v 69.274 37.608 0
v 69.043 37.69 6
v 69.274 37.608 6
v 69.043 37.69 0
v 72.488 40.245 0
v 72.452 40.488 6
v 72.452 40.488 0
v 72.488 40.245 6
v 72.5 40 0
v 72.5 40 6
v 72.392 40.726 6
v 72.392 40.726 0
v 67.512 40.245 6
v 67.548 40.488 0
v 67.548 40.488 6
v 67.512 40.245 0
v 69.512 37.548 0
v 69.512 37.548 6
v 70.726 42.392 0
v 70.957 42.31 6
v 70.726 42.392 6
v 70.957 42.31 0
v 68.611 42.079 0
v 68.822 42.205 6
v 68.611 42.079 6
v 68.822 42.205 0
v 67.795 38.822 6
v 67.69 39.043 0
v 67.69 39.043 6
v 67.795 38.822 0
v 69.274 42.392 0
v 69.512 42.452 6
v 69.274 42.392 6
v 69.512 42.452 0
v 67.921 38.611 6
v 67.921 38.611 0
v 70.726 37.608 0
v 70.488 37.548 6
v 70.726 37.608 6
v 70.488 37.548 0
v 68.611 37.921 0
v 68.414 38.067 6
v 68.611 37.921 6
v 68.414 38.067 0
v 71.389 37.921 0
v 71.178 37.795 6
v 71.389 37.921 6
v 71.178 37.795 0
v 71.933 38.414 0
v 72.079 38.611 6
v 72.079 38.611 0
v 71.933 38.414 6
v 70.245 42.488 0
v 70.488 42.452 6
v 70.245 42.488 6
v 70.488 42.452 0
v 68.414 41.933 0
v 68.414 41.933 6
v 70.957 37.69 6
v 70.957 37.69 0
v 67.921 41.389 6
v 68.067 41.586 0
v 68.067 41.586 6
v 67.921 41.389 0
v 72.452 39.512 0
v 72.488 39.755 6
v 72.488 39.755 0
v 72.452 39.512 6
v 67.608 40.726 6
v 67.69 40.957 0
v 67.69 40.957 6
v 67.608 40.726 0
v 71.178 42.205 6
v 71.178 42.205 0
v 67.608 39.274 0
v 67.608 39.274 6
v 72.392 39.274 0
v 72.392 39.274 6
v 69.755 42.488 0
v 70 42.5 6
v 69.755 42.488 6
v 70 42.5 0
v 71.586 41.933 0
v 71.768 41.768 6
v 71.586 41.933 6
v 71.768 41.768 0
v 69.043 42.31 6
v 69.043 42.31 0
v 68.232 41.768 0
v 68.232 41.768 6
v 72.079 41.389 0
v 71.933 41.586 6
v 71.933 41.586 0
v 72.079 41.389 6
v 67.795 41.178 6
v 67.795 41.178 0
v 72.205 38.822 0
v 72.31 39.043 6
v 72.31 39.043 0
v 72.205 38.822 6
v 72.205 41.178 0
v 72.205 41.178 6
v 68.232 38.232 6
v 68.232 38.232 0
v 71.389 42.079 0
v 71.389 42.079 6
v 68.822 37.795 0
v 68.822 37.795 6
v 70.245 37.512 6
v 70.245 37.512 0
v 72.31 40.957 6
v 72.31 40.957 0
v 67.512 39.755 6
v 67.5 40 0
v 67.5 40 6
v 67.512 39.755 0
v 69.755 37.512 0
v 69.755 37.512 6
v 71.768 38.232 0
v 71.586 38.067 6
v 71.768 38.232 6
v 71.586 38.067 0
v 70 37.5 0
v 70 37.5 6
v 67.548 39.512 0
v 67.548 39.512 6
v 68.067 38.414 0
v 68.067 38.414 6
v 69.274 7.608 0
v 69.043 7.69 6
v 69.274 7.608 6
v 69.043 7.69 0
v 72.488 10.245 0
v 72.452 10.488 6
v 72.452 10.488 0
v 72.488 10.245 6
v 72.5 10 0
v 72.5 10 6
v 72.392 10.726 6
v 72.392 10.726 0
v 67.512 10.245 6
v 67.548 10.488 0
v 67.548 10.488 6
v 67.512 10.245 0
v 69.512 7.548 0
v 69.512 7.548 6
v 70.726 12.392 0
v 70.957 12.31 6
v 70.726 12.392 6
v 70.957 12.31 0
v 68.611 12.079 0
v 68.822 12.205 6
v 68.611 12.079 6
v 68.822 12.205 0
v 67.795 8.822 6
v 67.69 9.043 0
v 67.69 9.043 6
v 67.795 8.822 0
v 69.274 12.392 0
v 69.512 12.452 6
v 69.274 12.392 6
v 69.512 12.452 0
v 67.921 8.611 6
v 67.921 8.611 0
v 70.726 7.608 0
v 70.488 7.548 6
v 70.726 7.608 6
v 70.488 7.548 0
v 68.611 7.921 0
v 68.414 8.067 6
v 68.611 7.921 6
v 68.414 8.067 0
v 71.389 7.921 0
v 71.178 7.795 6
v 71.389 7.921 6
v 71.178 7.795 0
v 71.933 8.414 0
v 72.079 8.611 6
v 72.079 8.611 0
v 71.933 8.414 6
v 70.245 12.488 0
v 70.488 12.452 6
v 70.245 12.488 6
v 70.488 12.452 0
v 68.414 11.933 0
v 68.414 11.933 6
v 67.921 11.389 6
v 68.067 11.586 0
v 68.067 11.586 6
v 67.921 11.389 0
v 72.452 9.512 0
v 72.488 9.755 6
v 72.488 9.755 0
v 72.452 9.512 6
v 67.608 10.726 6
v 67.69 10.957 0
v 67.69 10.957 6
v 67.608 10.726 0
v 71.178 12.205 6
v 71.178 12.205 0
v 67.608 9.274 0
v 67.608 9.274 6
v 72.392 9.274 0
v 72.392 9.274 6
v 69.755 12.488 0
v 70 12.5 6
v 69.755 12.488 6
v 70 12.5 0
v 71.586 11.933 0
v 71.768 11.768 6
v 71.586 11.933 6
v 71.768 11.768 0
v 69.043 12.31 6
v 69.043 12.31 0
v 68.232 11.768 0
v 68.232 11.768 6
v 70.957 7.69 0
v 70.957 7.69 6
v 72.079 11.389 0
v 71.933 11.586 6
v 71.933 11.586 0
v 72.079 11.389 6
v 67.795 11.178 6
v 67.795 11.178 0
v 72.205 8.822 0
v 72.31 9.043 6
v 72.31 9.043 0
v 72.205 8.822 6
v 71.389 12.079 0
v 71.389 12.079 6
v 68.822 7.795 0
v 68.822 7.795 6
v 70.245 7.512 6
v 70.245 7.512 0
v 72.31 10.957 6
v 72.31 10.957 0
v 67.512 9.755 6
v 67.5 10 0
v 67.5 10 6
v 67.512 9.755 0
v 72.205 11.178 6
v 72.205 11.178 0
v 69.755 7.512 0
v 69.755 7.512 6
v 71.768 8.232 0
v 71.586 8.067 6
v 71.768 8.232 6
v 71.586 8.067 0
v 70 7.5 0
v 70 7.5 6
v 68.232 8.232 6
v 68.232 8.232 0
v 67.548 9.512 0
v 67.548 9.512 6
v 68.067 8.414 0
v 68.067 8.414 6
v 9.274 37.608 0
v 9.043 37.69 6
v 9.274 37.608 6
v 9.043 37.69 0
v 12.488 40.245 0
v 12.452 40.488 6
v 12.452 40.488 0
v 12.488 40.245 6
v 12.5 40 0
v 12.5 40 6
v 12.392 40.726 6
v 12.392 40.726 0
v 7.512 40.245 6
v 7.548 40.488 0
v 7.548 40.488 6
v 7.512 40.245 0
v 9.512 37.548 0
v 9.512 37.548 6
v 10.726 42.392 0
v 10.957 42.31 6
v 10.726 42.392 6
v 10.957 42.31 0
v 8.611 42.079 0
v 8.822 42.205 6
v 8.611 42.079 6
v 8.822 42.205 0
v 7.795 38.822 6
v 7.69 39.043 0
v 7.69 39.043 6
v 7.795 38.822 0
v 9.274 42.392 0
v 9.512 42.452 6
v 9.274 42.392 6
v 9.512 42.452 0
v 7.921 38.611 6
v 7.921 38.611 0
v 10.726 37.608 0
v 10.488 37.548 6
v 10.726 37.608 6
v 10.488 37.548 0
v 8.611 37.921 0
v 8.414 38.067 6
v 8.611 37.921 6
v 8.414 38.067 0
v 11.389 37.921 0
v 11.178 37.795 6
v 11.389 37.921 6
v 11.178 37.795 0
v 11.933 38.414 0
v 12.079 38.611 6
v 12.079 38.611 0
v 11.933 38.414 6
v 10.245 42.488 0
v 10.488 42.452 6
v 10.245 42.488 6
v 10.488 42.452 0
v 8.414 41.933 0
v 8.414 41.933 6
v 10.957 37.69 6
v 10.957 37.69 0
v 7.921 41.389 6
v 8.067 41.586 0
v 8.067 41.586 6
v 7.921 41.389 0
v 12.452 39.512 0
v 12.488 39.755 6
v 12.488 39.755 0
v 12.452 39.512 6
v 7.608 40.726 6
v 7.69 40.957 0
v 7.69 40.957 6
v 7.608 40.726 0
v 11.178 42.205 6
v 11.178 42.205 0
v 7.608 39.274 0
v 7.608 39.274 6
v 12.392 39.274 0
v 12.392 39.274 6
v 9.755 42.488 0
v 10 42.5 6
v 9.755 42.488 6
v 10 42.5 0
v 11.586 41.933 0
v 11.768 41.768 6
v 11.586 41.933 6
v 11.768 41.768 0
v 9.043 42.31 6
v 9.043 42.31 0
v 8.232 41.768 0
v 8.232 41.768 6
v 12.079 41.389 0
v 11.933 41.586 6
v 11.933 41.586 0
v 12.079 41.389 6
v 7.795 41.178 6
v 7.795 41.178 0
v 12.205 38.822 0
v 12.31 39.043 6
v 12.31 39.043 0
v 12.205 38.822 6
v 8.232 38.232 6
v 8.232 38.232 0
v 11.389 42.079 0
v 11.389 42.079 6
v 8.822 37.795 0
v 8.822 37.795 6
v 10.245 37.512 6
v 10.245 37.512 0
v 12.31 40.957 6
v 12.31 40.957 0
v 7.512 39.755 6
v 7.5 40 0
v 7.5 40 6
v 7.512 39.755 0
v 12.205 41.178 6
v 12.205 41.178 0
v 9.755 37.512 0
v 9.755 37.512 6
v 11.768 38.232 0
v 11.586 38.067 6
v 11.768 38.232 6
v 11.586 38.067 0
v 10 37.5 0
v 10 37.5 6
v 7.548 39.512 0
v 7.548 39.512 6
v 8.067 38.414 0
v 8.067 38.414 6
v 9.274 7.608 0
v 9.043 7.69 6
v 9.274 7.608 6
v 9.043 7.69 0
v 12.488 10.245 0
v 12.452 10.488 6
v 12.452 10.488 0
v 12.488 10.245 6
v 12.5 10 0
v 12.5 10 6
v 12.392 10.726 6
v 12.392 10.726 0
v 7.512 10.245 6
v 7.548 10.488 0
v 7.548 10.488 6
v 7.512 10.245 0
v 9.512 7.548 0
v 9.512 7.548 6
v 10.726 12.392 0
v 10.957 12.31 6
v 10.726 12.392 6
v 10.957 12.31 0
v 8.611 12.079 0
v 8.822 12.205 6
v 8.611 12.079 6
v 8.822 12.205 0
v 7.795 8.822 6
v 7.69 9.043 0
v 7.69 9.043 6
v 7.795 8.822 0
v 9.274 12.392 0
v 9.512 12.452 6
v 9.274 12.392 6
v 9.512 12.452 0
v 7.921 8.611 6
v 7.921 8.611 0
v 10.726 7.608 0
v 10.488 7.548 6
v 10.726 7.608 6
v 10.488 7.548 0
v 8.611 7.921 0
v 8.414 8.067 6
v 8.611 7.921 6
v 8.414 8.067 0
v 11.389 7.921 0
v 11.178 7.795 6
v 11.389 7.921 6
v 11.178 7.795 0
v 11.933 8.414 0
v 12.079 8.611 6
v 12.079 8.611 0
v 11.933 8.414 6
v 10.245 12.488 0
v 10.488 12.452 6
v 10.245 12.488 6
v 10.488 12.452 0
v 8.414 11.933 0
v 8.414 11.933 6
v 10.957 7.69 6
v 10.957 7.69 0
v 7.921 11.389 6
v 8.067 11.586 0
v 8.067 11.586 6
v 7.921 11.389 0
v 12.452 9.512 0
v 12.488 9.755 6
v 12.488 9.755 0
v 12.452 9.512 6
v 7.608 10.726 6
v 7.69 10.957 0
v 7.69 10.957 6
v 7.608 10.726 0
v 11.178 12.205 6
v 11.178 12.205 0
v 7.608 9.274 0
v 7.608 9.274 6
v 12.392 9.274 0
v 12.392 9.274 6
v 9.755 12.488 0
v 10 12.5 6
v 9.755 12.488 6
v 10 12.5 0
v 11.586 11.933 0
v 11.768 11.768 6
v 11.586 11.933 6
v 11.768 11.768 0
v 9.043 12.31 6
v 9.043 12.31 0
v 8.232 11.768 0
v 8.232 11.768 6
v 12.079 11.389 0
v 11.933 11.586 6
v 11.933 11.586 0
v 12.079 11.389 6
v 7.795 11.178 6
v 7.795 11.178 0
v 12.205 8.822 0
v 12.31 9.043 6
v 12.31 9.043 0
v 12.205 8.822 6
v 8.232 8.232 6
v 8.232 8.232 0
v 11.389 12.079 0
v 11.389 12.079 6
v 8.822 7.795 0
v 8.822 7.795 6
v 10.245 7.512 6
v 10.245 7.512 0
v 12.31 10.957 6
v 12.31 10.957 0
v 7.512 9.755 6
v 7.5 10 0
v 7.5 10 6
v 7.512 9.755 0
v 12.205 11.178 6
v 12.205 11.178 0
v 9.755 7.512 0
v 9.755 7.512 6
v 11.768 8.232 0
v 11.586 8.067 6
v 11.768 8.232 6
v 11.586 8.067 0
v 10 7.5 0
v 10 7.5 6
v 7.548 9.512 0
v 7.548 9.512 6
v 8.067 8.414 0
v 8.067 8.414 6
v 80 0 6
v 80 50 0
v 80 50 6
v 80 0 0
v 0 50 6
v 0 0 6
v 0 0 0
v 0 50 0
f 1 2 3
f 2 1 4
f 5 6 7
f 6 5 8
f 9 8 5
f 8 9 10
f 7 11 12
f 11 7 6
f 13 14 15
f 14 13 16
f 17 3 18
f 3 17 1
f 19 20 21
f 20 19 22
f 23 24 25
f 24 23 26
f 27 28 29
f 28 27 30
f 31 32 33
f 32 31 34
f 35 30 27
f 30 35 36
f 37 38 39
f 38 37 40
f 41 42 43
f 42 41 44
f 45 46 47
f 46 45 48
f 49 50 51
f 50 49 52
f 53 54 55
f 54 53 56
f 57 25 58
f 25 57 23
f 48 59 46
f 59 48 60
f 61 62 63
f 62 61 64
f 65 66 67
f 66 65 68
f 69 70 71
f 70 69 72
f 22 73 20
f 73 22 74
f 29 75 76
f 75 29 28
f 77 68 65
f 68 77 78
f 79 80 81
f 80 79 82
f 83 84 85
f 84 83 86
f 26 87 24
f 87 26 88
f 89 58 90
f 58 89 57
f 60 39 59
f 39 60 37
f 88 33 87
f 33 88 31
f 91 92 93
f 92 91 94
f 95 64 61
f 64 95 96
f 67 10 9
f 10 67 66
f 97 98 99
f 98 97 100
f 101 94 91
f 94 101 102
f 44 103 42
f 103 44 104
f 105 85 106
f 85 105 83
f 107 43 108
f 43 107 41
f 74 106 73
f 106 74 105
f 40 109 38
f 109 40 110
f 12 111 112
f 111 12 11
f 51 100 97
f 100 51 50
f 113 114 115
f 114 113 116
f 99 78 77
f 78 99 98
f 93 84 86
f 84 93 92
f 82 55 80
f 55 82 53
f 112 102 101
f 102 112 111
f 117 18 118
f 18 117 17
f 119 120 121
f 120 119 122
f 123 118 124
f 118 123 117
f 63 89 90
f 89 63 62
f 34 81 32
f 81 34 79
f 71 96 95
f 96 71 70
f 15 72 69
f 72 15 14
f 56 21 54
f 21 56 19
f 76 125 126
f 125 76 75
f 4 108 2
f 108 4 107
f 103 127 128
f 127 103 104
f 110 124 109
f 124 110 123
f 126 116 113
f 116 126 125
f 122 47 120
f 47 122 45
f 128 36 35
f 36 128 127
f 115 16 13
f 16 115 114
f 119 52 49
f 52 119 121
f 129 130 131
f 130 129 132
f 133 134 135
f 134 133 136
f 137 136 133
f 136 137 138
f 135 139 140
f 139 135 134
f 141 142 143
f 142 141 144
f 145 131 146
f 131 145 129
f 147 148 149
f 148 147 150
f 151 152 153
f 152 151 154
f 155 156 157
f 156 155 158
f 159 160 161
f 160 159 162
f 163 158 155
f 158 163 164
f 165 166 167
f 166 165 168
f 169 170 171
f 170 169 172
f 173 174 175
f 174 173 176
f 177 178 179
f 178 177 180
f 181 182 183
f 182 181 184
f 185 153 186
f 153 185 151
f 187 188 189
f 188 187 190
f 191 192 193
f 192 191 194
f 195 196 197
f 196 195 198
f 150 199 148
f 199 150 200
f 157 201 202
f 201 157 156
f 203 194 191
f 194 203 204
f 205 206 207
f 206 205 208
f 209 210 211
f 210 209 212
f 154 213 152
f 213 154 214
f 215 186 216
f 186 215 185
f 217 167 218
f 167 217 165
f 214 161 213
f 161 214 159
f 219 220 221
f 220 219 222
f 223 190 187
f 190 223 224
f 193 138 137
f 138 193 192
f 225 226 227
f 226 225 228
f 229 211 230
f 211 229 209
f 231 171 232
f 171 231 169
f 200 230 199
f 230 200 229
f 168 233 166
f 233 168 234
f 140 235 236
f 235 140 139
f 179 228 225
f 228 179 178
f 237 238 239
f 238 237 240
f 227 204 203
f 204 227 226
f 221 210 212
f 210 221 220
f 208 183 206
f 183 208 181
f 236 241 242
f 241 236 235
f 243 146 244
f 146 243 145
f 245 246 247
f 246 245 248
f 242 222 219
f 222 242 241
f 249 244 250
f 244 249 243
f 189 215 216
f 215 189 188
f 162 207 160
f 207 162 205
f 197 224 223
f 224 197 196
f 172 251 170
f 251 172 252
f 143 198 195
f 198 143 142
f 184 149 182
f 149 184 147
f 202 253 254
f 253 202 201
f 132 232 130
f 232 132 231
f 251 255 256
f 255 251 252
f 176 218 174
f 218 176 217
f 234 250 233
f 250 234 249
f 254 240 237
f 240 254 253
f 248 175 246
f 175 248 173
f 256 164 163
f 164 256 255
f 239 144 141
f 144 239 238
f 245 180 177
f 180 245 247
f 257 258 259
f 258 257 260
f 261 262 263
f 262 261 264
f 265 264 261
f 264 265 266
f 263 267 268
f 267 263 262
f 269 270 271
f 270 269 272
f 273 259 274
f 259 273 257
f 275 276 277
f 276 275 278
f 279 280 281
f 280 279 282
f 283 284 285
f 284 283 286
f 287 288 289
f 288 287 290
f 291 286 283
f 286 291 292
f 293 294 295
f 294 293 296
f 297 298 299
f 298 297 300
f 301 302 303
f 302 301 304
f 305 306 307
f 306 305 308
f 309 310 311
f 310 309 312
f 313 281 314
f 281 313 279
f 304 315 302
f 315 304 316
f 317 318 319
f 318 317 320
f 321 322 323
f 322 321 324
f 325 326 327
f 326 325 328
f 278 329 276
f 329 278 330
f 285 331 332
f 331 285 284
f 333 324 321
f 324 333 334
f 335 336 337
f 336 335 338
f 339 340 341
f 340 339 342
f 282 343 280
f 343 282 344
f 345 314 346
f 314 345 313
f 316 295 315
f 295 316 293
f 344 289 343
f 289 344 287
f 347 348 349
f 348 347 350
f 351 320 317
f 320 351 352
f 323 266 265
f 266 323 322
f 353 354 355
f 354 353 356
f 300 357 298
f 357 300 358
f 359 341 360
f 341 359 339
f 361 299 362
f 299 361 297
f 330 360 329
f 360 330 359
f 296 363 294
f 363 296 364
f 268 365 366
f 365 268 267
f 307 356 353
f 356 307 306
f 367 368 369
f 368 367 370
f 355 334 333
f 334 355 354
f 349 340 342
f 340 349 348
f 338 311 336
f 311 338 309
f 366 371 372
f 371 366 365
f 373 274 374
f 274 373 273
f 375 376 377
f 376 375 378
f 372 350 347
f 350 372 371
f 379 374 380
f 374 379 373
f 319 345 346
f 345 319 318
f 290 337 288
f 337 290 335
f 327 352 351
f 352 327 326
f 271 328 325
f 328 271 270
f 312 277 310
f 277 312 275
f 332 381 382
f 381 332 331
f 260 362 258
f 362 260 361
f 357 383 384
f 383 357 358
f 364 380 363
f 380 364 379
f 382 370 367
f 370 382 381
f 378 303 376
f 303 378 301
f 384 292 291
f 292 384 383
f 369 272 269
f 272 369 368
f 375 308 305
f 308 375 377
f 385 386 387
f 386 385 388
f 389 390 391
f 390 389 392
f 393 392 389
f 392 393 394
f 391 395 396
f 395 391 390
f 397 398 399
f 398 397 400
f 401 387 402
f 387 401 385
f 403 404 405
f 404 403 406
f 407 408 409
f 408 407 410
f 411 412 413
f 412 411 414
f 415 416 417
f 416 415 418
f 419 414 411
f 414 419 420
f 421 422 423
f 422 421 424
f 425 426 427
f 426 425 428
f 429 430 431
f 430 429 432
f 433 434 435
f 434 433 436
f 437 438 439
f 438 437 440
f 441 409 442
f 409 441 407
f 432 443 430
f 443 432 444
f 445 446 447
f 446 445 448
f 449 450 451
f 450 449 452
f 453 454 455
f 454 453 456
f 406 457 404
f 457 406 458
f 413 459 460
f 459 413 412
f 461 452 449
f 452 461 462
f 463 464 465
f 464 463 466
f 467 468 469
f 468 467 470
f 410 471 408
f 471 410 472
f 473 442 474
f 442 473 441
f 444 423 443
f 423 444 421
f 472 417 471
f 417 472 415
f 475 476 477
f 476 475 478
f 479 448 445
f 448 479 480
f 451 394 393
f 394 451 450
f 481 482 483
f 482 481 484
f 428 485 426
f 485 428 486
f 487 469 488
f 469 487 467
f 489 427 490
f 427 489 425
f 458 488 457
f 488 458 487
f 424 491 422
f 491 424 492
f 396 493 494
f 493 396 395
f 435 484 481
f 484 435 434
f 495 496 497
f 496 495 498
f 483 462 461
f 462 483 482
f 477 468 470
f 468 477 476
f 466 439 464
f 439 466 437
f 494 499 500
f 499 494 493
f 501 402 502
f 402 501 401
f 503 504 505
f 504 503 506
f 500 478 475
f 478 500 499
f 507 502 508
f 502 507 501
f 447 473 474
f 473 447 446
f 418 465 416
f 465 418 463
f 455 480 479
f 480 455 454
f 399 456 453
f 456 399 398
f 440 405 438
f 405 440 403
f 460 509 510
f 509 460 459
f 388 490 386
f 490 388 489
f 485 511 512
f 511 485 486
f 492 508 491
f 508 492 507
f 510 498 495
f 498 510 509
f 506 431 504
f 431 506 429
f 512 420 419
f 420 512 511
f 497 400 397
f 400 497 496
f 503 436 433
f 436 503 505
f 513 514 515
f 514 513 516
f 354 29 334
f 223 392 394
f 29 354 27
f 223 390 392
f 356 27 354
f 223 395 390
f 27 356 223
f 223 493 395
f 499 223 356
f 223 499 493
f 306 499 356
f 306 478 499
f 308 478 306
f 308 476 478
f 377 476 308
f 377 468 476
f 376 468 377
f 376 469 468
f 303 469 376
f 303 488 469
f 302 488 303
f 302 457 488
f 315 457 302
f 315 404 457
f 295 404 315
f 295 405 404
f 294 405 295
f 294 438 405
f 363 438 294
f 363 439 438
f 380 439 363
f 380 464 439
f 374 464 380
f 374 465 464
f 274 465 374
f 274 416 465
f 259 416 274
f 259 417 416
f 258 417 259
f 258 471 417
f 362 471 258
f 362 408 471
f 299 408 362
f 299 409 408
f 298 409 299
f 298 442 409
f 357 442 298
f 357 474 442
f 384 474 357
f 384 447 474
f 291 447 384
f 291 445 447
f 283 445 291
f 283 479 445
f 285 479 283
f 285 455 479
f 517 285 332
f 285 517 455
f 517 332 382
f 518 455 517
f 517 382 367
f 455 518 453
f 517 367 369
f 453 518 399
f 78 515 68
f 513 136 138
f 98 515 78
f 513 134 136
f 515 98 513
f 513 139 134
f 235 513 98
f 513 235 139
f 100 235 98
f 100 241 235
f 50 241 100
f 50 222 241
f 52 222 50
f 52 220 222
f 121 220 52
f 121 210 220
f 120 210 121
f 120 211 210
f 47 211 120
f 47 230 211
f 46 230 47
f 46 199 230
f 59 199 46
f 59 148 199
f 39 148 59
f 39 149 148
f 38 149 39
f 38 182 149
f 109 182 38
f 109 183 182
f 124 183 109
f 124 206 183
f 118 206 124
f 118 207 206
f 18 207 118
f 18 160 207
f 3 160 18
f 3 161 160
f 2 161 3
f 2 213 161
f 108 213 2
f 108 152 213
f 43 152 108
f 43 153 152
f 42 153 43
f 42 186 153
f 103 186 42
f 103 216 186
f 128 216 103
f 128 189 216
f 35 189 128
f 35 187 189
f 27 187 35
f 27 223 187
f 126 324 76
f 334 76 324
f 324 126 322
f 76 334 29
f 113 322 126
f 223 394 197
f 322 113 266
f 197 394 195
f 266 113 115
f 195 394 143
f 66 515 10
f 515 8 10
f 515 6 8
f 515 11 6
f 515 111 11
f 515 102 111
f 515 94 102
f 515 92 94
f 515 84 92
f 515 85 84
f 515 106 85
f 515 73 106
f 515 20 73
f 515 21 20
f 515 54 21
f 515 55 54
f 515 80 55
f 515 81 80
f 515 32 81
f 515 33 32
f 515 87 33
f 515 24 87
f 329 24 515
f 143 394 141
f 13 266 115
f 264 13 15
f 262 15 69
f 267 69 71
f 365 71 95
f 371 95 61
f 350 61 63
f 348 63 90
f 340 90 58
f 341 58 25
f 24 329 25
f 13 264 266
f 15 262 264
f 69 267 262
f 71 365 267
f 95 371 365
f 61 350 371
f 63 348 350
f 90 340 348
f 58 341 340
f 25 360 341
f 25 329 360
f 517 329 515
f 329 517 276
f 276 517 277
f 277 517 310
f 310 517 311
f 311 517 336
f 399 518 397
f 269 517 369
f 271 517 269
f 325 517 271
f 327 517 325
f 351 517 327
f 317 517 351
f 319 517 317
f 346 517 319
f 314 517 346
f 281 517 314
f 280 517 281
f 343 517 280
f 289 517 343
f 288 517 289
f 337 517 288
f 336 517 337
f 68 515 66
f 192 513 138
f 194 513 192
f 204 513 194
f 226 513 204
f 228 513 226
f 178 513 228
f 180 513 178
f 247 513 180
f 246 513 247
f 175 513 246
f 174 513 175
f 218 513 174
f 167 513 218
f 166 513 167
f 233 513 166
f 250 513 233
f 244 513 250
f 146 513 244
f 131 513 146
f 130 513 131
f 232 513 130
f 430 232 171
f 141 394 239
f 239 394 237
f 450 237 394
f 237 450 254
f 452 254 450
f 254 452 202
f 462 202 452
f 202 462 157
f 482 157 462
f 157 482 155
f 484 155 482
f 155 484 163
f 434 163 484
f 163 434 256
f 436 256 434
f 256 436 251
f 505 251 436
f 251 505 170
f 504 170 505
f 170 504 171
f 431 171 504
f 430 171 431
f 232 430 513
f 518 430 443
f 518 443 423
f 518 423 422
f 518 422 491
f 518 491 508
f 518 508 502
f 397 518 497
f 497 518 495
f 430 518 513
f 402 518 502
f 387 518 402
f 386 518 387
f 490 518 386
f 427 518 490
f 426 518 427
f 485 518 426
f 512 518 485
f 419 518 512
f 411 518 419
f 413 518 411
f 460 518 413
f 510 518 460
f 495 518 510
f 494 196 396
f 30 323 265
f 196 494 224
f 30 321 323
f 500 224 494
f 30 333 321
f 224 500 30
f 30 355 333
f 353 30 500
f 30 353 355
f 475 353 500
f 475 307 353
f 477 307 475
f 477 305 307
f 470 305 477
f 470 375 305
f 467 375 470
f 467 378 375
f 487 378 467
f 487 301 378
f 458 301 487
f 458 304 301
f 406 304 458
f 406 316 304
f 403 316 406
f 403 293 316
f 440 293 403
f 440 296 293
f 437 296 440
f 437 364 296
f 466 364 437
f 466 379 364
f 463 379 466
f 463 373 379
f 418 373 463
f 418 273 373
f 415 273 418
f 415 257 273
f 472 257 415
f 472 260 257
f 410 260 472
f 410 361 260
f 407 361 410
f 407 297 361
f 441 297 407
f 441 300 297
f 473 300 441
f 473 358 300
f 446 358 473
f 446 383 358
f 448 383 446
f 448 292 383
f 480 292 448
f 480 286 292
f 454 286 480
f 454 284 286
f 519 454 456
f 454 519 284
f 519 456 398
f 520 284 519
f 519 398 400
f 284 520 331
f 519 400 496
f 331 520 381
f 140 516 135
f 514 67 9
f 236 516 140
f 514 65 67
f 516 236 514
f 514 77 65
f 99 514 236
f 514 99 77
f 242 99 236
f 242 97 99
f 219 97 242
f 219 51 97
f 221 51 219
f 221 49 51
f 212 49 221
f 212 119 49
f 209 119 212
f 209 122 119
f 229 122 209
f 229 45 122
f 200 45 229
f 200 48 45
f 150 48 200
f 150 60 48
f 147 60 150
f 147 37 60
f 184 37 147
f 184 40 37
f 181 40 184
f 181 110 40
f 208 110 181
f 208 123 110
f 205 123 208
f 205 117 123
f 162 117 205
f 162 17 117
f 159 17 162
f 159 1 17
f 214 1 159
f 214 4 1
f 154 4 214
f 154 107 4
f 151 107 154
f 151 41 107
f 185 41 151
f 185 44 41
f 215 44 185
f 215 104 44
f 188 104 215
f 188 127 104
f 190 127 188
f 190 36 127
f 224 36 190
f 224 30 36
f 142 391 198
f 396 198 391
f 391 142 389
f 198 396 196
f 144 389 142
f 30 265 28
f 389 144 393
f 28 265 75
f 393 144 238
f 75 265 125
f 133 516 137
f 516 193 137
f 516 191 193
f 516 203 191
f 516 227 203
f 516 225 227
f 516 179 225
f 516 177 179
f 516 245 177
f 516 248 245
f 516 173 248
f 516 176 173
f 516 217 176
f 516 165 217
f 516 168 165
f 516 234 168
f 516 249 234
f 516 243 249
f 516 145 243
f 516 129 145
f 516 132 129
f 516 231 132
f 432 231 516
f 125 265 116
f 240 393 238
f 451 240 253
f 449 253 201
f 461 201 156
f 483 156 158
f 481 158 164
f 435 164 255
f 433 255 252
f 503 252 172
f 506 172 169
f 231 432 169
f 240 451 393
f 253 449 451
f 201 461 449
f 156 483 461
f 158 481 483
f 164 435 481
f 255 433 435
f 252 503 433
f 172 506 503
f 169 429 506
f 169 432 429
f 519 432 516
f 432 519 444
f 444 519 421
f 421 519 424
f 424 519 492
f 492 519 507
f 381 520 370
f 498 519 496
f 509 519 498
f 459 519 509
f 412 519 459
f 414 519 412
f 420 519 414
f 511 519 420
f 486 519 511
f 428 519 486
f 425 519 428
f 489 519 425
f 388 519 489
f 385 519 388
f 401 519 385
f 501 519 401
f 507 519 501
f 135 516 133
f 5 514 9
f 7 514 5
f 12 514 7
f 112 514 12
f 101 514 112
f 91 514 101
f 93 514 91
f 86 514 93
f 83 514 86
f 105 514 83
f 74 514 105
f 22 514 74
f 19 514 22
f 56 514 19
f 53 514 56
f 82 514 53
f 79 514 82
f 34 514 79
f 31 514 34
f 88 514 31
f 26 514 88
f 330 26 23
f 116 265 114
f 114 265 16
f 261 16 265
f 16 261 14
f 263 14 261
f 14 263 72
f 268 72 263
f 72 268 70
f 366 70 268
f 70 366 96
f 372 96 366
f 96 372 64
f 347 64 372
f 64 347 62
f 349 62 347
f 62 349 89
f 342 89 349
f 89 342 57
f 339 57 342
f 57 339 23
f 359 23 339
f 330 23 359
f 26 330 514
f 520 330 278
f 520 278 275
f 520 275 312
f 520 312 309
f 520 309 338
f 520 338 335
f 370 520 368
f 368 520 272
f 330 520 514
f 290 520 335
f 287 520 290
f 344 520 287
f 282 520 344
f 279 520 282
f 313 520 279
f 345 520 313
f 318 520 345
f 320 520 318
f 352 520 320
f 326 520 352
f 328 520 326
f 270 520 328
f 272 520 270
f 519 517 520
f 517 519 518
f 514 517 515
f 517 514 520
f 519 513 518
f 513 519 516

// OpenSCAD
// 3. OpenSCAD port of 03_bolt_plate.sc, kept for comparison.
// Same plate, derived spacing and 2x2 hole pattern. Units are implicitly mm.
L = 80;
W = 50;
T = 6;
inset = 10;
hole_d = 5;
hole_x = L - inset;
hole_y = W - inset;

// Small overshoot so the cut faces don't coincide with the plate faces.
eps = 0.01;
$fn = 64;

module first_hole() {
  // `hole ... depth T` drills from the top face (z = T) down to z = 0.
  translate([hole_x, hole_y, -eps]) cylinder(d = hole_d, h = T + 2 * eps);
}

difference() {
  cube([L, W, T]);
  // pattern: dir (-1,0,0) count 2 spacing L-2*inset, dir2 (0,-1,0) count2 2 spacing2 W-2*inset
  for (i = [0 : 1], j = [0 : 1])
    translate([-i * (L - 2 * inset), -j * (W - 2 * inset), 0]) first_hole();
}
